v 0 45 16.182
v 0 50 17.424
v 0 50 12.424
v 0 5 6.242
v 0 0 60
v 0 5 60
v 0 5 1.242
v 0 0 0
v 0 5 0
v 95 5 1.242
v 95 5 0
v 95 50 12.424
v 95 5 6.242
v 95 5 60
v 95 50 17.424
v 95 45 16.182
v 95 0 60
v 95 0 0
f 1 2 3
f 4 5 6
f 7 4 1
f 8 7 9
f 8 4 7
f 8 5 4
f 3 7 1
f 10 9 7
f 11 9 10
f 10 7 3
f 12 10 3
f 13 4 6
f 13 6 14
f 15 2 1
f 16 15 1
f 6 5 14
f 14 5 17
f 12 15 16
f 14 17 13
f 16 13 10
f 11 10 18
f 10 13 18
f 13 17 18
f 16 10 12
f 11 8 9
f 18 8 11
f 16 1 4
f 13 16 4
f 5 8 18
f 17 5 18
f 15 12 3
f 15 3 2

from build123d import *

# Parameters (mm, degrees)
SKETCH1_W           = 95
SKETCH1_H           = 60
BOSS_EXTRUDE1_DEPTH = 5
BOSS_EXTRUDE3_DEPTH = 95


with BuildPart() as part:
    # Sketch1 → Boss-Extrude1 (new body)
    with BuildSketch(Plane(origin=(0, 0, 0), x_dir=(1, 0, 0), z_dir=(0, 1, 0))):
        with Locations((47.5, -30)):
            Rectangle(SKETCH1_W, SKETCH1_H)
    extrude(amount=BOSS_EXTRUDE1_DEPTH)

    # Sketch6 → Boss-Extrude3 (add)
    with BuildSketch(Plane.ZY):
        Polygon((0, 0), (12.424467848, 50), (17.424467848, 50), (16.182021063, 45), (5, 0), align=None)
    extrude(amount=-BOSS_EXTRUDE3_DEPTH)


solid = part.part
